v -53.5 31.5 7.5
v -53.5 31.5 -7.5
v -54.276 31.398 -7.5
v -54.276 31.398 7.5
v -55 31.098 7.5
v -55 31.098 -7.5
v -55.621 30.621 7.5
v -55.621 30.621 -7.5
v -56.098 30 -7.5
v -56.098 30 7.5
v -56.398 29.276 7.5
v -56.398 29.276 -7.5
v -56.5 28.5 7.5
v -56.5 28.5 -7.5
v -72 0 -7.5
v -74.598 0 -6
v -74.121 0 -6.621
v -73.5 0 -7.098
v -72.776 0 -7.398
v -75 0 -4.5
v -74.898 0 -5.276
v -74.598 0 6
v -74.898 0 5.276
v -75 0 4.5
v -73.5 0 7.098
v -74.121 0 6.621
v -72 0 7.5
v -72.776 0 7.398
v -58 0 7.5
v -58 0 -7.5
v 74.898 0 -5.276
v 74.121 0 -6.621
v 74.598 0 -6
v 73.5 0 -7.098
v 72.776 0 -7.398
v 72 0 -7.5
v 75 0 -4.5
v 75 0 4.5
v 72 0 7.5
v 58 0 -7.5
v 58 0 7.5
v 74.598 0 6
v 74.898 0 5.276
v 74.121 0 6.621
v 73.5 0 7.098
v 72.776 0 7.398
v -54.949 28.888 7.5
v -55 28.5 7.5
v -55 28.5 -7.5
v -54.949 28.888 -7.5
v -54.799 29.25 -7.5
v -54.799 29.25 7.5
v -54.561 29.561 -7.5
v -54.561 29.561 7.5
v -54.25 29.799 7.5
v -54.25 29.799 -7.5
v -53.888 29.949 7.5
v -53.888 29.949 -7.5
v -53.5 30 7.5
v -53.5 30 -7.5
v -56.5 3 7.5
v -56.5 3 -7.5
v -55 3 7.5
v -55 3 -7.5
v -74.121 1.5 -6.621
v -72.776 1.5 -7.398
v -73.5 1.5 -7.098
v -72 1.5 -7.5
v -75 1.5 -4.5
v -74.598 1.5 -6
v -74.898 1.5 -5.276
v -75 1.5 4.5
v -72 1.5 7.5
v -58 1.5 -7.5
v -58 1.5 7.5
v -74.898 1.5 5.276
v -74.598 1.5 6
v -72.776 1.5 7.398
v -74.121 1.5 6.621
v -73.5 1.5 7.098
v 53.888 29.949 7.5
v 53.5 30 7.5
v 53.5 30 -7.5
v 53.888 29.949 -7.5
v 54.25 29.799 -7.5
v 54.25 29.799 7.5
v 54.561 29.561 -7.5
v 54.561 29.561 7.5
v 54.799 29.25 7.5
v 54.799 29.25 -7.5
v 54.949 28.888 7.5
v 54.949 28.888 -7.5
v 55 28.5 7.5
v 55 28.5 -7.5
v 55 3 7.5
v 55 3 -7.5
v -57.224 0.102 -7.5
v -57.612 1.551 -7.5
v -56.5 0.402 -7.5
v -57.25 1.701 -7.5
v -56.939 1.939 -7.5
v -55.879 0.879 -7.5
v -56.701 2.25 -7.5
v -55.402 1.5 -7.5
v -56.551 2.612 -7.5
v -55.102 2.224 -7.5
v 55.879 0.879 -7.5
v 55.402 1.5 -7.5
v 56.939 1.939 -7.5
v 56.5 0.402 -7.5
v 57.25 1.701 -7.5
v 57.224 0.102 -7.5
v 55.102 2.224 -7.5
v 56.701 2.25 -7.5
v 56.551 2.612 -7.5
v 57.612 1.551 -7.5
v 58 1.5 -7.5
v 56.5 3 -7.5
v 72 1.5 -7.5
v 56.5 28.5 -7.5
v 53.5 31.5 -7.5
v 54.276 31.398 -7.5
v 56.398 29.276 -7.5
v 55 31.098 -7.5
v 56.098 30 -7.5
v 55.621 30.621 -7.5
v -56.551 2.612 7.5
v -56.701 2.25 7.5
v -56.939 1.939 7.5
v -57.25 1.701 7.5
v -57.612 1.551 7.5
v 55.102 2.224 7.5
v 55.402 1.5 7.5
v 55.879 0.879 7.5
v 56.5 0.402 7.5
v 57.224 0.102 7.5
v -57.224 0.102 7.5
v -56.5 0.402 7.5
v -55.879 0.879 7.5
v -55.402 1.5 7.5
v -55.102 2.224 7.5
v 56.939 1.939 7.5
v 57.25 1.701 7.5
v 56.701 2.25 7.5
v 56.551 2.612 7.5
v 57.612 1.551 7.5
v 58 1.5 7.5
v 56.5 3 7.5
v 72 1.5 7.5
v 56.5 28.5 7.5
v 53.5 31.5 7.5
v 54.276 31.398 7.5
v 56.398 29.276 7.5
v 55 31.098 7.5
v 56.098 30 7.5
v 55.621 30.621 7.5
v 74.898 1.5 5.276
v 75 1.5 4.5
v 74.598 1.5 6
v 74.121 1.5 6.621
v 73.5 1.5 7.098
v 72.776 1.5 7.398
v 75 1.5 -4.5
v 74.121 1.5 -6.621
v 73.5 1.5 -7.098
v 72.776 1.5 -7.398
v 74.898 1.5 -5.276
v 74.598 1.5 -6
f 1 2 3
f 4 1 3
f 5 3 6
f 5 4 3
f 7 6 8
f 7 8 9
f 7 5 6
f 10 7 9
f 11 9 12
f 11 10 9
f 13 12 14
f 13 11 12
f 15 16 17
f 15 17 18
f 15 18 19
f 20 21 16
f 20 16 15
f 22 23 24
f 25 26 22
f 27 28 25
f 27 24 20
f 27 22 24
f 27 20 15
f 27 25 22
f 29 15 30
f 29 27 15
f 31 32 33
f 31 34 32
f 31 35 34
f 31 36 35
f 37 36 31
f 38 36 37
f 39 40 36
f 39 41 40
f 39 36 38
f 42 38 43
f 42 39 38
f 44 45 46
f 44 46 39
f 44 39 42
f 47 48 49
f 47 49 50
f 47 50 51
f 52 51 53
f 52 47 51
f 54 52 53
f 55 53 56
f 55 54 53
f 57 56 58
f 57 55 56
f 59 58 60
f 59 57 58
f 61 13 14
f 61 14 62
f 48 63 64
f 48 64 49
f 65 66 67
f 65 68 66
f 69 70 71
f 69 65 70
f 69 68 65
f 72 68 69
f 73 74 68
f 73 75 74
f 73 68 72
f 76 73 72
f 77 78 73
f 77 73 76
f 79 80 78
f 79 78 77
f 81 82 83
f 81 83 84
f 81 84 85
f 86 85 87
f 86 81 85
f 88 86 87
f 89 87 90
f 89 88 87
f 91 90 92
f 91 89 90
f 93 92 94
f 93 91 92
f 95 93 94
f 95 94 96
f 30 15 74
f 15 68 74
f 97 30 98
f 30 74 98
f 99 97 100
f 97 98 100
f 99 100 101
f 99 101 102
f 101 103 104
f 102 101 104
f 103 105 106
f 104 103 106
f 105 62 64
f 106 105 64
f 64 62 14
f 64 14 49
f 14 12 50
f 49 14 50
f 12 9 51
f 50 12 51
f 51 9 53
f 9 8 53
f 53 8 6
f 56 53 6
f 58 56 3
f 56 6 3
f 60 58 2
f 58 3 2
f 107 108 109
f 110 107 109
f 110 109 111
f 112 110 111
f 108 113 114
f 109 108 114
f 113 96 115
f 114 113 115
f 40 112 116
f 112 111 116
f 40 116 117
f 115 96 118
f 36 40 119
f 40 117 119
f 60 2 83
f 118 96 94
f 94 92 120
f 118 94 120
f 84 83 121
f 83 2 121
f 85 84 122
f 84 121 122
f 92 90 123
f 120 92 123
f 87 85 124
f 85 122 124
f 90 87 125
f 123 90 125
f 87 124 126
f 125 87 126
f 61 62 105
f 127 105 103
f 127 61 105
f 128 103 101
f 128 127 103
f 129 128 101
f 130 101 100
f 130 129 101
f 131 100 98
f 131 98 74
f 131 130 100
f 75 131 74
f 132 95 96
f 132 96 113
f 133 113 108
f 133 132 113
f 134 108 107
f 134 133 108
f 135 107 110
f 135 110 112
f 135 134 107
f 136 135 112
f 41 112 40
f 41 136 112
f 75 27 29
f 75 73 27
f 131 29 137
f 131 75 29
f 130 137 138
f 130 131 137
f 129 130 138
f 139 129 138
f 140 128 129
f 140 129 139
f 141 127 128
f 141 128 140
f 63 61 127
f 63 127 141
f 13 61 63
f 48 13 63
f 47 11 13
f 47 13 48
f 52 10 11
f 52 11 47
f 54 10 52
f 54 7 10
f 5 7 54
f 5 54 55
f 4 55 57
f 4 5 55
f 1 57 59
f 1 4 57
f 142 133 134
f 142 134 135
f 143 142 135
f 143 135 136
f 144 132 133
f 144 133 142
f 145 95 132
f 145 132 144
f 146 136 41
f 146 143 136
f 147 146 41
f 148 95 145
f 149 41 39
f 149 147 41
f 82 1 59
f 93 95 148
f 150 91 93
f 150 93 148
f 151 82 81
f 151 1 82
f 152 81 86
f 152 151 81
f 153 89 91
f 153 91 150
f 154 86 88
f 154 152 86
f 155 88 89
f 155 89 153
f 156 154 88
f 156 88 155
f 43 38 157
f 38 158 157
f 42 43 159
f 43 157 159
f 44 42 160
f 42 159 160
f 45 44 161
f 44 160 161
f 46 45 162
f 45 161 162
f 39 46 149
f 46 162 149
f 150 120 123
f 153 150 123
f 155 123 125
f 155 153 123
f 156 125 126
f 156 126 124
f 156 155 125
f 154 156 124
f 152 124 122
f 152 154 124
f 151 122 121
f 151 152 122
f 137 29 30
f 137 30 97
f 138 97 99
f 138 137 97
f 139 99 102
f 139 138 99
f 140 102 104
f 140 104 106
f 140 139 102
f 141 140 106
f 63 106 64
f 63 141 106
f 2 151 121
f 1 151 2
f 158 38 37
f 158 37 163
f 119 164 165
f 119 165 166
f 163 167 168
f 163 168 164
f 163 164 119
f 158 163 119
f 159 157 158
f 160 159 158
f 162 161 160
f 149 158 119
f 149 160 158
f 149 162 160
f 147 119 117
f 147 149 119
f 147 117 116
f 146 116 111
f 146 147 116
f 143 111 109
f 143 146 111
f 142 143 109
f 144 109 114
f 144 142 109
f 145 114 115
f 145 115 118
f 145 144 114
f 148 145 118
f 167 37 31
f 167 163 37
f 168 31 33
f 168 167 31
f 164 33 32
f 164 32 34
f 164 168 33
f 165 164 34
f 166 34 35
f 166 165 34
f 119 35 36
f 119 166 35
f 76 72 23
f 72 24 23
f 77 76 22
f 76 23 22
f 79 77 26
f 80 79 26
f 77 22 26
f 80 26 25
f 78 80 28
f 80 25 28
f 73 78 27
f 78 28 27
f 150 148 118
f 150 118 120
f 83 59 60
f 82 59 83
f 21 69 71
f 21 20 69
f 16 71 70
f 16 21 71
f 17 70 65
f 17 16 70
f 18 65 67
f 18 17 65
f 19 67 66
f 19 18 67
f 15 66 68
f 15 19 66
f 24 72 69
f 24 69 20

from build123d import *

# Parameters (mm, degrees)
BASE_FLANGE1_DEPTH = 7.5
FILLET1_R          = 3


# Sheet-metal steps are written as plain solids
with BuildPart() as part:
    # Sketch1 → Base-Flange1 (new, symmetric)
    with BuildSketch(Plane.XY):
        with BuildLine():
            Line((-75, 0), (-58, 0))
            ThreePointArc((-58, 0), (-55.878679656, 0.878679656), (-55, 3))
            Line((-55, 3), (-55, 28.5))
            ThreePointArc((-55, 28.5), (-54.560660172, 29.560660172), (-53.5, 30))
            Line((-53.5, 30), (53.5, 30))
            ThreePointArc((53.5, 30), (54.560660172, 29.560660172), (55, 28.5))
            Line((55, 28.5), (55, 3))
            ThreePointArc((55, 3), (55.878679656, 0.878679656), (58, 0))
            Line((58, 0), (75, 0))
            Line((75, 0), (75, 1.5))
            Line((75, 1.5), (58, 1.5))
            ThreePointArc((58, 1.5), (56.939339828, 1.939339828), (56.5, 3))
            Line((56.5, 3), (56.5, 28.5))
            ThreePointArc((56.5, 28.5), (55.621320344, 30.621320344), (53.5, 31.5))
            Line((53.5, 31.5), (-53.5, 31.5))
            ThreePointArc((-53.5, 31.5), (-55.621320344, 30.621320344), (-56.5, 28.5))
            Line((-56.5, 28.5), (-56.5, 3))
            ThreePointArc((-56.5, 3), (-56.939339828, 1.939339828), (-58, 1.5))
            Line((-58, 1.5), (-75, 1.5))
            Line((-75, 1.5), (-75, 0))
        make_face()
    extrude(amount=BASE_FLANGE1_DEPTH, both=True)

    # Fillet1
    fillet1_edges = [part.edges().sort_by_distance(p)[0] for p in [
        (75, 0.75, -7.5),
        (-75, 0.75, -7.5),
        (75, 0.75, 7.5),
        (-75, 0.75, 7.5),
    ]]
    fillet(fillet1_edges, radius=FILLET1_R)


solid = part.part
